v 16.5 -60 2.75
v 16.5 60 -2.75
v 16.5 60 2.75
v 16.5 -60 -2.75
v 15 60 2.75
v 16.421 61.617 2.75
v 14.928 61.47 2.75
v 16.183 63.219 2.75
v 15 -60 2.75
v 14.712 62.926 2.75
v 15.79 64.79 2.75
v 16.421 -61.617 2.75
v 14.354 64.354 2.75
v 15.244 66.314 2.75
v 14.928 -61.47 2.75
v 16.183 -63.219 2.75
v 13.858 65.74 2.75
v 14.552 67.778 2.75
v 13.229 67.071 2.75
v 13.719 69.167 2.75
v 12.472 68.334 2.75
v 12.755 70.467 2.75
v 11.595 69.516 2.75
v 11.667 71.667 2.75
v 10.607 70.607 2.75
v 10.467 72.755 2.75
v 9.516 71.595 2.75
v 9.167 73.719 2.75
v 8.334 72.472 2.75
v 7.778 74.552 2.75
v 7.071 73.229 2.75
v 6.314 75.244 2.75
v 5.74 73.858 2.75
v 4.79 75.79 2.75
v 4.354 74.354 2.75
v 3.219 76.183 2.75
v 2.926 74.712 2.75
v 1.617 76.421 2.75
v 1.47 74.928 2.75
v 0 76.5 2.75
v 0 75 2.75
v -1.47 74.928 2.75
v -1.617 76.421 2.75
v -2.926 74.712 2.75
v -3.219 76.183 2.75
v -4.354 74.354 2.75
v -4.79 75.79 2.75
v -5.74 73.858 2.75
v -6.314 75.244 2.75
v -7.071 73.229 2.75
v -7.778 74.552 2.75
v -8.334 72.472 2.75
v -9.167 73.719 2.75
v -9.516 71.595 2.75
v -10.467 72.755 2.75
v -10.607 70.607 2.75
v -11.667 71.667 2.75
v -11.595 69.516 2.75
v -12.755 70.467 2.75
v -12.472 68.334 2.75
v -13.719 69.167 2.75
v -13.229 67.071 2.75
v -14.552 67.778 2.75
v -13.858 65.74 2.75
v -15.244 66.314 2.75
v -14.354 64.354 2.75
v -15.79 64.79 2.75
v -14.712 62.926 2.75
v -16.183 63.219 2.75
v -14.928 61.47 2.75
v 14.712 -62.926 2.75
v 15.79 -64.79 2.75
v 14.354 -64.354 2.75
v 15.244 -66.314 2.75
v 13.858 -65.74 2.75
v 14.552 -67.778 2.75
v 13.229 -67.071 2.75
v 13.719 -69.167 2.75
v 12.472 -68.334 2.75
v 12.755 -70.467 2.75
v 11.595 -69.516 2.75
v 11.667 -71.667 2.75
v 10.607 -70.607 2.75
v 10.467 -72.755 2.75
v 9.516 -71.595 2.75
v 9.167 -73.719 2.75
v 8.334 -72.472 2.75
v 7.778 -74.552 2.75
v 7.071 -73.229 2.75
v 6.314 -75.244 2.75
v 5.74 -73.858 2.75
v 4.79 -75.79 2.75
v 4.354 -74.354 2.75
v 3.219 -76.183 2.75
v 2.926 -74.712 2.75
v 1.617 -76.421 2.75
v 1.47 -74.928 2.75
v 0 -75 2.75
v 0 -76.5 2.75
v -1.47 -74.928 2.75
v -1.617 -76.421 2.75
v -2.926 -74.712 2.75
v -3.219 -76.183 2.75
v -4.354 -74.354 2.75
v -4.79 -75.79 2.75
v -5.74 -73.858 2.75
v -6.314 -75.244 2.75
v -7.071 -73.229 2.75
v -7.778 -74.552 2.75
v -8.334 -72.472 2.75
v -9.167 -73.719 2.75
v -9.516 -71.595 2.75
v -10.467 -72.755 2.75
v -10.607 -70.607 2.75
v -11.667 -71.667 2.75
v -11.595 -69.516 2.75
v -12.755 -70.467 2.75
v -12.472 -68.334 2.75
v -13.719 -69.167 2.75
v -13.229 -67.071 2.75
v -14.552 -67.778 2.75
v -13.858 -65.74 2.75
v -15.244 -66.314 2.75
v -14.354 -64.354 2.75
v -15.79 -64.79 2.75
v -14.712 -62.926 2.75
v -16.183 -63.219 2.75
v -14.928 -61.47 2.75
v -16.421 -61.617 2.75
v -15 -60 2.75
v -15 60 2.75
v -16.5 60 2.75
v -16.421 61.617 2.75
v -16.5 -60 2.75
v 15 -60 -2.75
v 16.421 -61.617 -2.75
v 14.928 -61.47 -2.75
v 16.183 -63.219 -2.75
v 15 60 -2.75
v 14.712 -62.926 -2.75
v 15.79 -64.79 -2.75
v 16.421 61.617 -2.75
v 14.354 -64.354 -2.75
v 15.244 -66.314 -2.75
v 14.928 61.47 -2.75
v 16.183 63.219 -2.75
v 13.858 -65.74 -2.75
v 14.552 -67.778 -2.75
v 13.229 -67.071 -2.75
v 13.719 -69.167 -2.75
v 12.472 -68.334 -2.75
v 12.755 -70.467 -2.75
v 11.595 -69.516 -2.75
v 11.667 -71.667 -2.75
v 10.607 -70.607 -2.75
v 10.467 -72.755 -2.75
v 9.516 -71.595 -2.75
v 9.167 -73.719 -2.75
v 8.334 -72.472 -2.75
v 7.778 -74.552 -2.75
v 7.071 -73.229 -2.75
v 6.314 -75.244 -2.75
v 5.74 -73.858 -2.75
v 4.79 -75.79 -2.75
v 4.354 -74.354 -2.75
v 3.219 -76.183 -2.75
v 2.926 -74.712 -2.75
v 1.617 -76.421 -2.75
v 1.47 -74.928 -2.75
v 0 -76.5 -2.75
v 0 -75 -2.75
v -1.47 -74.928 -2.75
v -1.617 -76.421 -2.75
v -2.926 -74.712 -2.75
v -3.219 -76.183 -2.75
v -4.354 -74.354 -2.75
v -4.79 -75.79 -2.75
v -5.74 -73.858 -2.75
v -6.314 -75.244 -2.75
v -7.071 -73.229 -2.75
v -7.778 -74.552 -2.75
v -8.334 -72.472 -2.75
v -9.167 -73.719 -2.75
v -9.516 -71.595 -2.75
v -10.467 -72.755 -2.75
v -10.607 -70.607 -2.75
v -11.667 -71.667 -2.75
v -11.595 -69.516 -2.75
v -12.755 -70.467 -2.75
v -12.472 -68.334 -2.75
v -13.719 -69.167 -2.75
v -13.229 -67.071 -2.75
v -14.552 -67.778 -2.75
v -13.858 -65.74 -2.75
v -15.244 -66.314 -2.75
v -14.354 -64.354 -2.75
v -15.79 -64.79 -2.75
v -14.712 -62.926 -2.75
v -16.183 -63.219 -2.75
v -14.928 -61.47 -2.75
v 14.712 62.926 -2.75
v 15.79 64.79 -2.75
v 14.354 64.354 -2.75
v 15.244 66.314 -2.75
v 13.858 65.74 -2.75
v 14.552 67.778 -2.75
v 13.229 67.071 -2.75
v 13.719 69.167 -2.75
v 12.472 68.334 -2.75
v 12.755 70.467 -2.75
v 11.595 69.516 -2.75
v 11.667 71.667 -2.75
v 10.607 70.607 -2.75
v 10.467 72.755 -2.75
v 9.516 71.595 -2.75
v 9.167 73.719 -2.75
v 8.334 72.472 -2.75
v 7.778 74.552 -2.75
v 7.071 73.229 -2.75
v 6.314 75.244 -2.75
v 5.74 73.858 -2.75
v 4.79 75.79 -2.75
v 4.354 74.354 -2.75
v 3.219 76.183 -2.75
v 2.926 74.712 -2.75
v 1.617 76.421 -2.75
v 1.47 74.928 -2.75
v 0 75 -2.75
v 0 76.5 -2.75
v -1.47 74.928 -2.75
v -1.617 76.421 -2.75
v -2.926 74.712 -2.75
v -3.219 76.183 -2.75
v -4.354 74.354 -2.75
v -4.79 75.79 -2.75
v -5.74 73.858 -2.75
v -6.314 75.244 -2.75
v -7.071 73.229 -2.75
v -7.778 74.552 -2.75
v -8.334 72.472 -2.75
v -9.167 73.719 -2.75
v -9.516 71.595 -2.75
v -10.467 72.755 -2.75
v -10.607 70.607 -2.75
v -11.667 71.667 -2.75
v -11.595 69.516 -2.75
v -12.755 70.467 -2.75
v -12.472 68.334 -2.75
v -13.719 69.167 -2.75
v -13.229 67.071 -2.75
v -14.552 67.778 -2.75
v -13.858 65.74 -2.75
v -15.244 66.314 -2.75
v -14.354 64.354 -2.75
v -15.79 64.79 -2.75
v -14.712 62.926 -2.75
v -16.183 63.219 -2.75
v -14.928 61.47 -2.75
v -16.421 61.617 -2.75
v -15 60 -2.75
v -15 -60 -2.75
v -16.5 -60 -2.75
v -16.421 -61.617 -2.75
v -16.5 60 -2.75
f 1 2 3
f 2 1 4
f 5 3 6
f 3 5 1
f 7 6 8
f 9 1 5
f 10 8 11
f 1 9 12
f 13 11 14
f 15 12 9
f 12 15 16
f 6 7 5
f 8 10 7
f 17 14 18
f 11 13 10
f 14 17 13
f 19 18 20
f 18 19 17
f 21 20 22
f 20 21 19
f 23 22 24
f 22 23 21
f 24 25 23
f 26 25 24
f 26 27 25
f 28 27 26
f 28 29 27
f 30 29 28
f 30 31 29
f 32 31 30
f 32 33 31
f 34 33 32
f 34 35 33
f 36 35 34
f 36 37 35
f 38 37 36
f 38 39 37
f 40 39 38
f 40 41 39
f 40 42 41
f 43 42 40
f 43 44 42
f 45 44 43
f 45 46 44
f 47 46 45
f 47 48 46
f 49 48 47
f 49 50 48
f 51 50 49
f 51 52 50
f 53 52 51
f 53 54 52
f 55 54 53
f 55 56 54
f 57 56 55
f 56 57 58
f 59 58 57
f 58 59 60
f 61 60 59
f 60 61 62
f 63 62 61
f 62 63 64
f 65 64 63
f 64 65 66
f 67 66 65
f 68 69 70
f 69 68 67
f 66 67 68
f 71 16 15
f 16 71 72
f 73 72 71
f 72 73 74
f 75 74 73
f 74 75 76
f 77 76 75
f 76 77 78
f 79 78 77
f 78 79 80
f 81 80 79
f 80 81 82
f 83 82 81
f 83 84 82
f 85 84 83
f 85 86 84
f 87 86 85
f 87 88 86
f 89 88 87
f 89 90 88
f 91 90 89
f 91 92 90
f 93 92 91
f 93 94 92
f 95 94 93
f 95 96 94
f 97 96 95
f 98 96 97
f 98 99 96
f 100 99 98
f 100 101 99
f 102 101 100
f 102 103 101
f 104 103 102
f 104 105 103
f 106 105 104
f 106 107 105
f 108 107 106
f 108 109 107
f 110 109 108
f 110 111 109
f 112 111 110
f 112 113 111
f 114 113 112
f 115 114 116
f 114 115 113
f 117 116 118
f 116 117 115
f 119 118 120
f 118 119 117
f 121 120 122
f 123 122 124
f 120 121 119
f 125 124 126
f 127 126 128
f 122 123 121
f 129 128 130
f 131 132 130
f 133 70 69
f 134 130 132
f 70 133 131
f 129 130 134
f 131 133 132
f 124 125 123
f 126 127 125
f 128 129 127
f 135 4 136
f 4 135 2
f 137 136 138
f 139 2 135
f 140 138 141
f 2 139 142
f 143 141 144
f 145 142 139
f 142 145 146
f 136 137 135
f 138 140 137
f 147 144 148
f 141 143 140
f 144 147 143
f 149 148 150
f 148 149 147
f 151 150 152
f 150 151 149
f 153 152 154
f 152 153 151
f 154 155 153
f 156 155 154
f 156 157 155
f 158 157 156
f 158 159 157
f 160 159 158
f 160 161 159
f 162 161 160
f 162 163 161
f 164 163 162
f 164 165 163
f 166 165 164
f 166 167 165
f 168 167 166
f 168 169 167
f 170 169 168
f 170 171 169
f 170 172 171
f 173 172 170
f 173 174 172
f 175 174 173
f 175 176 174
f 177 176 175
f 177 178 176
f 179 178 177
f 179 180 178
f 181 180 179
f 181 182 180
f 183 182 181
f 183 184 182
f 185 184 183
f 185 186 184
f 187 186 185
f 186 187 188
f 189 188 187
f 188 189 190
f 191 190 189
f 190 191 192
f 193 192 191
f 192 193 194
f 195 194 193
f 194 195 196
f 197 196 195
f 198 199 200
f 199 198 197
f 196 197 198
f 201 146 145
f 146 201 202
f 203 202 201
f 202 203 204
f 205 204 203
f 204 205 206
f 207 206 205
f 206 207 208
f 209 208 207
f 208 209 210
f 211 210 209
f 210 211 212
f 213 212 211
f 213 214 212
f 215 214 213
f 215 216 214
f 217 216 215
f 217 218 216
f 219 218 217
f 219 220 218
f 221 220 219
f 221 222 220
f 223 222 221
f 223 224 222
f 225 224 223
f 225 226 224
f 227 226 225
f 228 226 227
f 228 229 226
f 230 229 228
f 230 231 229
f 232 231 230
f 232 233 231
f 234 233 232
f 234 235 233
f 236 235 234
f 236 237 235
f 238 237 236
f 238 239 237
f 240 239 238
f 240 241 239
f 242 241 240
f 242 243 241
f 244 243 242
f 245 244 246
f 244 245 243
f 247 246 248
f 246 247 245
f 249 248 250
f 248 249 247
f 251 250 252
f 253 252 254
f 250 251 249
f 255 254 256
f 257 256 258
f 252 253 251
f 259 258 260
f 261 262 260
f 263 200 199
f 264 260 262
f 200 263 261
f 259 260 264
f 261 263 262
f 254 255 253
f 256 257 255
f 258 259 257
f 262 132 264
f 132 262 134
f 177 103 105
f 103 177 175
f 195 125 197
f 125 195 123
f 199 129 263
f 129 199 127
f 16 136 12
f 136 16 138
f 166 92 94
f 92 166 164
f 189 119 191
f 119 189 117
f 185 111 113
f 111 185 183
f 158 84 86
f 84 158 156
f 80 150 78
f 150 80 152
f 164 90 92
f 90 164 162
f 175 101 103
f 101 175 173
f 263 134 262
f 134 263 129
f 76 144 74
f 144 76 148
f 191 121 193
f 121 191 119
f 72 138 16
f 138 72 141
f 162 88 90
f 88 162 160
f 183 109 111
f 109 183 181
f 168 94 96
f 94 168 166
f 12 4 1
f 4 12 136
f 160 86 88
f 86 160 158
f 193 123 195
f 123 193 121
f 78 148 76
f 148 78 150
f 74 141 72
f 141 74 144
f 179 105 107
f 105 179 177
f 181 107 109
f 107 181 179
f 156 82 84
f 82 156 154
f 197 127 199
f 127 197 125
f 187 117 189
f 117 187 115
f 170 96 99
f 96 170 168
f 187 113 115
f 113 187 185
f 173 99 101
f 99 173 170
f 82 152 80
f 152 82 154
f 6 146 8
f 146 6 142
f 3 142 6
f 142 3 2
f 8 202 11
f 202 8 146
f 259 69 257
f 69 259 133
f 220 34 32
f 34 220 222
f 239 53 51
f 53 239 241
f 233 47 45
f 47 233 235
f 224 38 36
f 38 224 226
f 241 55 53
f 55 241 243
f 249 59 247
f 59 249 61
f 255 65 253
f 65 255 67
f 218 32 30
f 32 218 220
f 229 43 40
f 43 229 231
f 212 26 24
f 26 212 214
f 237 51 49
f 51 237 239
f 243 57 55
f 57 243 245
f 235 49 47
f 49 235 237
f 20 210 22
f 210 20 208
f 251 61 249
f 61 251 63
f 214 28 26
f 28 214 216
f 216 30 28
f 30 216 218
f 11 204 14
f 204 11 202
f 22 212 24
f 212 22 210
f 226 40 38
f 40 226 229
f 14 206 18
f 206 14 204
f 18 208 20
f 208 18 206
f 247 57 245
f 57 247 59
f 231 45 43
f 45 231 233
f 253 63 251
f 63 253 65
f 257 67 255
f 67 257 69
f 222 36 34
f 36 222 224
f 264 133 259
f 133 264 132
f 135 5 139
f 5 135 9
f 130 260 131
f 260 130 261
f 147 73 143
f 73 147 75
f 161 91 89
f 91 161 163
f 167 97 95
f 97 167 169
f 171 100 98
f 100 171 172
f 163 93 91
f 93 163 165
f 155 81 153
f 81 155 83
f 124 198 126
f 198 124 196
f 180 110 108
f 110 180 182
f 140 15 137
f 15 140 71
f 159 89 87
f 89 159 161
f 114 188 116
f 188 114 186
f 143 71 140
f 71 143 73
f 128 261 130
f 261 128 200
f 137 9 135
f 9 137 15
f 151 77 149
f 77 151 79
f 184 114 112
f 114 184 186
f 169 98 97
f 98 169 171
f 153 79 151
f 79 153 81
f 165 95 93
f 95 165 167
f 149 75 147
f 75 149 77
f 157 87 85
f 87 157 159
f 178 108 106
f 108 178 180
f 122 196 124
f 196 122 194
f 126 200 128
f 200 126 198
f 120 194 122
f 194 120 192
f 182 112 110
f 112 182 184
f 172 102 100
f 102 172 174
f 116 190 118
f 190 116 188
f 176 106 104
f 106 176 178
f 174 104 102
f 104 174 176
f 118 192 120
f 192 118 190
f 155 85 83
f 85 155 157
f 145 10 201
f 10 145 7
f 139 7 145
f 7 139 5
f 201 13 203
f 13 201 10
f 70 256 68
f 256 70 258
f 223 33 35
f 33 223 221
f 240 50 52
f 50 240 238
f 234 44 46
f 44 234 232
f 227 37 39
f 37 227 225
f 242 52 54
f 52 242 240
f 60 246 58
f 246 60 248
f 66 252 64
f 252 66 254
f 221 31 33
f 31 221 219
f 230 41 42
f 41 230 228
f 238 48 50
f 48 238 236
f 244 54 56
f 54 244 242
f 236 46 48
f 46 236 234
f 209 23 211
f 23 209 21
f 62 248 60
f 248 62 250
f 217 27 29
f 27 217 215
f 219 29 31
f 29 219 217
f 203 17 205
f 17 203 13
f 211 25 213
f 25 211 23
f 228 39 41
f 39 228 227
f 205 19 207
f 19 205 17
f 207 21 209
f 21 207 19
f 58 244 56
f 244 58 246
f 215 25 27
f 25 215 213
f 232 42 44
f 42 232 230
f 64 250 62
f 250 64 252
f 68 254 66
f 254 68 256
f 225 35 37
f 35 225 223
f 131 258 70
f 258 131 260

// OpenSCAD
$fn=64;

plate_debth_new = 2.8;
plate_len = 120;
plate_width = 33;

rib(rib_debth = 3,rib_height = 5.5);

module rib(rib_debth,rib_height){
    difference(){
        //scale([1,1,rib_height])
        plate(plate_debth=rib_height);
        translate([0,0,0])
        //scale([1,1,rib_height])
        cube([plate_width-rib_debth,plate_len,rib_height+1], center = true);
        
        color("red")
        translate([0,-plate_len/2,0])
        //scale([1,1,rib_height])
        cylinder(h=rib_height+1, d=plate_width-rib_debth, center = true );
        
        color("green")
        translate([0,plate_len/2,0])
        //scale([1,1,rib_height])
        cylinder(h=rib_height+1, d=plate_width-rib_debth, center = true );
    }
}
module plate(plate_debth){
    difference(){
        base(plate_debth);
        holes();
    } 
}

module holes(){
    translate([0,-plate_len/2,0])
    cylinder(h = 40, d=6.5, center = true);
    
    translate([0,plate_len/2,0])
    cylinder(h = 40, d=6.5, center = true);
}

module base(plate_debth){
    cube([plate_width,plate_len,plate_debth], center = true);
    color("red")
    translate([0,-plate_len/2,0])
    cylinder(h=plate_debth, d=plate_width, center = true );
    color("green")
    translate([0,plate_len/2,0])
    cylinder(h=plate_debth, d=plate_width, center = true );
}
